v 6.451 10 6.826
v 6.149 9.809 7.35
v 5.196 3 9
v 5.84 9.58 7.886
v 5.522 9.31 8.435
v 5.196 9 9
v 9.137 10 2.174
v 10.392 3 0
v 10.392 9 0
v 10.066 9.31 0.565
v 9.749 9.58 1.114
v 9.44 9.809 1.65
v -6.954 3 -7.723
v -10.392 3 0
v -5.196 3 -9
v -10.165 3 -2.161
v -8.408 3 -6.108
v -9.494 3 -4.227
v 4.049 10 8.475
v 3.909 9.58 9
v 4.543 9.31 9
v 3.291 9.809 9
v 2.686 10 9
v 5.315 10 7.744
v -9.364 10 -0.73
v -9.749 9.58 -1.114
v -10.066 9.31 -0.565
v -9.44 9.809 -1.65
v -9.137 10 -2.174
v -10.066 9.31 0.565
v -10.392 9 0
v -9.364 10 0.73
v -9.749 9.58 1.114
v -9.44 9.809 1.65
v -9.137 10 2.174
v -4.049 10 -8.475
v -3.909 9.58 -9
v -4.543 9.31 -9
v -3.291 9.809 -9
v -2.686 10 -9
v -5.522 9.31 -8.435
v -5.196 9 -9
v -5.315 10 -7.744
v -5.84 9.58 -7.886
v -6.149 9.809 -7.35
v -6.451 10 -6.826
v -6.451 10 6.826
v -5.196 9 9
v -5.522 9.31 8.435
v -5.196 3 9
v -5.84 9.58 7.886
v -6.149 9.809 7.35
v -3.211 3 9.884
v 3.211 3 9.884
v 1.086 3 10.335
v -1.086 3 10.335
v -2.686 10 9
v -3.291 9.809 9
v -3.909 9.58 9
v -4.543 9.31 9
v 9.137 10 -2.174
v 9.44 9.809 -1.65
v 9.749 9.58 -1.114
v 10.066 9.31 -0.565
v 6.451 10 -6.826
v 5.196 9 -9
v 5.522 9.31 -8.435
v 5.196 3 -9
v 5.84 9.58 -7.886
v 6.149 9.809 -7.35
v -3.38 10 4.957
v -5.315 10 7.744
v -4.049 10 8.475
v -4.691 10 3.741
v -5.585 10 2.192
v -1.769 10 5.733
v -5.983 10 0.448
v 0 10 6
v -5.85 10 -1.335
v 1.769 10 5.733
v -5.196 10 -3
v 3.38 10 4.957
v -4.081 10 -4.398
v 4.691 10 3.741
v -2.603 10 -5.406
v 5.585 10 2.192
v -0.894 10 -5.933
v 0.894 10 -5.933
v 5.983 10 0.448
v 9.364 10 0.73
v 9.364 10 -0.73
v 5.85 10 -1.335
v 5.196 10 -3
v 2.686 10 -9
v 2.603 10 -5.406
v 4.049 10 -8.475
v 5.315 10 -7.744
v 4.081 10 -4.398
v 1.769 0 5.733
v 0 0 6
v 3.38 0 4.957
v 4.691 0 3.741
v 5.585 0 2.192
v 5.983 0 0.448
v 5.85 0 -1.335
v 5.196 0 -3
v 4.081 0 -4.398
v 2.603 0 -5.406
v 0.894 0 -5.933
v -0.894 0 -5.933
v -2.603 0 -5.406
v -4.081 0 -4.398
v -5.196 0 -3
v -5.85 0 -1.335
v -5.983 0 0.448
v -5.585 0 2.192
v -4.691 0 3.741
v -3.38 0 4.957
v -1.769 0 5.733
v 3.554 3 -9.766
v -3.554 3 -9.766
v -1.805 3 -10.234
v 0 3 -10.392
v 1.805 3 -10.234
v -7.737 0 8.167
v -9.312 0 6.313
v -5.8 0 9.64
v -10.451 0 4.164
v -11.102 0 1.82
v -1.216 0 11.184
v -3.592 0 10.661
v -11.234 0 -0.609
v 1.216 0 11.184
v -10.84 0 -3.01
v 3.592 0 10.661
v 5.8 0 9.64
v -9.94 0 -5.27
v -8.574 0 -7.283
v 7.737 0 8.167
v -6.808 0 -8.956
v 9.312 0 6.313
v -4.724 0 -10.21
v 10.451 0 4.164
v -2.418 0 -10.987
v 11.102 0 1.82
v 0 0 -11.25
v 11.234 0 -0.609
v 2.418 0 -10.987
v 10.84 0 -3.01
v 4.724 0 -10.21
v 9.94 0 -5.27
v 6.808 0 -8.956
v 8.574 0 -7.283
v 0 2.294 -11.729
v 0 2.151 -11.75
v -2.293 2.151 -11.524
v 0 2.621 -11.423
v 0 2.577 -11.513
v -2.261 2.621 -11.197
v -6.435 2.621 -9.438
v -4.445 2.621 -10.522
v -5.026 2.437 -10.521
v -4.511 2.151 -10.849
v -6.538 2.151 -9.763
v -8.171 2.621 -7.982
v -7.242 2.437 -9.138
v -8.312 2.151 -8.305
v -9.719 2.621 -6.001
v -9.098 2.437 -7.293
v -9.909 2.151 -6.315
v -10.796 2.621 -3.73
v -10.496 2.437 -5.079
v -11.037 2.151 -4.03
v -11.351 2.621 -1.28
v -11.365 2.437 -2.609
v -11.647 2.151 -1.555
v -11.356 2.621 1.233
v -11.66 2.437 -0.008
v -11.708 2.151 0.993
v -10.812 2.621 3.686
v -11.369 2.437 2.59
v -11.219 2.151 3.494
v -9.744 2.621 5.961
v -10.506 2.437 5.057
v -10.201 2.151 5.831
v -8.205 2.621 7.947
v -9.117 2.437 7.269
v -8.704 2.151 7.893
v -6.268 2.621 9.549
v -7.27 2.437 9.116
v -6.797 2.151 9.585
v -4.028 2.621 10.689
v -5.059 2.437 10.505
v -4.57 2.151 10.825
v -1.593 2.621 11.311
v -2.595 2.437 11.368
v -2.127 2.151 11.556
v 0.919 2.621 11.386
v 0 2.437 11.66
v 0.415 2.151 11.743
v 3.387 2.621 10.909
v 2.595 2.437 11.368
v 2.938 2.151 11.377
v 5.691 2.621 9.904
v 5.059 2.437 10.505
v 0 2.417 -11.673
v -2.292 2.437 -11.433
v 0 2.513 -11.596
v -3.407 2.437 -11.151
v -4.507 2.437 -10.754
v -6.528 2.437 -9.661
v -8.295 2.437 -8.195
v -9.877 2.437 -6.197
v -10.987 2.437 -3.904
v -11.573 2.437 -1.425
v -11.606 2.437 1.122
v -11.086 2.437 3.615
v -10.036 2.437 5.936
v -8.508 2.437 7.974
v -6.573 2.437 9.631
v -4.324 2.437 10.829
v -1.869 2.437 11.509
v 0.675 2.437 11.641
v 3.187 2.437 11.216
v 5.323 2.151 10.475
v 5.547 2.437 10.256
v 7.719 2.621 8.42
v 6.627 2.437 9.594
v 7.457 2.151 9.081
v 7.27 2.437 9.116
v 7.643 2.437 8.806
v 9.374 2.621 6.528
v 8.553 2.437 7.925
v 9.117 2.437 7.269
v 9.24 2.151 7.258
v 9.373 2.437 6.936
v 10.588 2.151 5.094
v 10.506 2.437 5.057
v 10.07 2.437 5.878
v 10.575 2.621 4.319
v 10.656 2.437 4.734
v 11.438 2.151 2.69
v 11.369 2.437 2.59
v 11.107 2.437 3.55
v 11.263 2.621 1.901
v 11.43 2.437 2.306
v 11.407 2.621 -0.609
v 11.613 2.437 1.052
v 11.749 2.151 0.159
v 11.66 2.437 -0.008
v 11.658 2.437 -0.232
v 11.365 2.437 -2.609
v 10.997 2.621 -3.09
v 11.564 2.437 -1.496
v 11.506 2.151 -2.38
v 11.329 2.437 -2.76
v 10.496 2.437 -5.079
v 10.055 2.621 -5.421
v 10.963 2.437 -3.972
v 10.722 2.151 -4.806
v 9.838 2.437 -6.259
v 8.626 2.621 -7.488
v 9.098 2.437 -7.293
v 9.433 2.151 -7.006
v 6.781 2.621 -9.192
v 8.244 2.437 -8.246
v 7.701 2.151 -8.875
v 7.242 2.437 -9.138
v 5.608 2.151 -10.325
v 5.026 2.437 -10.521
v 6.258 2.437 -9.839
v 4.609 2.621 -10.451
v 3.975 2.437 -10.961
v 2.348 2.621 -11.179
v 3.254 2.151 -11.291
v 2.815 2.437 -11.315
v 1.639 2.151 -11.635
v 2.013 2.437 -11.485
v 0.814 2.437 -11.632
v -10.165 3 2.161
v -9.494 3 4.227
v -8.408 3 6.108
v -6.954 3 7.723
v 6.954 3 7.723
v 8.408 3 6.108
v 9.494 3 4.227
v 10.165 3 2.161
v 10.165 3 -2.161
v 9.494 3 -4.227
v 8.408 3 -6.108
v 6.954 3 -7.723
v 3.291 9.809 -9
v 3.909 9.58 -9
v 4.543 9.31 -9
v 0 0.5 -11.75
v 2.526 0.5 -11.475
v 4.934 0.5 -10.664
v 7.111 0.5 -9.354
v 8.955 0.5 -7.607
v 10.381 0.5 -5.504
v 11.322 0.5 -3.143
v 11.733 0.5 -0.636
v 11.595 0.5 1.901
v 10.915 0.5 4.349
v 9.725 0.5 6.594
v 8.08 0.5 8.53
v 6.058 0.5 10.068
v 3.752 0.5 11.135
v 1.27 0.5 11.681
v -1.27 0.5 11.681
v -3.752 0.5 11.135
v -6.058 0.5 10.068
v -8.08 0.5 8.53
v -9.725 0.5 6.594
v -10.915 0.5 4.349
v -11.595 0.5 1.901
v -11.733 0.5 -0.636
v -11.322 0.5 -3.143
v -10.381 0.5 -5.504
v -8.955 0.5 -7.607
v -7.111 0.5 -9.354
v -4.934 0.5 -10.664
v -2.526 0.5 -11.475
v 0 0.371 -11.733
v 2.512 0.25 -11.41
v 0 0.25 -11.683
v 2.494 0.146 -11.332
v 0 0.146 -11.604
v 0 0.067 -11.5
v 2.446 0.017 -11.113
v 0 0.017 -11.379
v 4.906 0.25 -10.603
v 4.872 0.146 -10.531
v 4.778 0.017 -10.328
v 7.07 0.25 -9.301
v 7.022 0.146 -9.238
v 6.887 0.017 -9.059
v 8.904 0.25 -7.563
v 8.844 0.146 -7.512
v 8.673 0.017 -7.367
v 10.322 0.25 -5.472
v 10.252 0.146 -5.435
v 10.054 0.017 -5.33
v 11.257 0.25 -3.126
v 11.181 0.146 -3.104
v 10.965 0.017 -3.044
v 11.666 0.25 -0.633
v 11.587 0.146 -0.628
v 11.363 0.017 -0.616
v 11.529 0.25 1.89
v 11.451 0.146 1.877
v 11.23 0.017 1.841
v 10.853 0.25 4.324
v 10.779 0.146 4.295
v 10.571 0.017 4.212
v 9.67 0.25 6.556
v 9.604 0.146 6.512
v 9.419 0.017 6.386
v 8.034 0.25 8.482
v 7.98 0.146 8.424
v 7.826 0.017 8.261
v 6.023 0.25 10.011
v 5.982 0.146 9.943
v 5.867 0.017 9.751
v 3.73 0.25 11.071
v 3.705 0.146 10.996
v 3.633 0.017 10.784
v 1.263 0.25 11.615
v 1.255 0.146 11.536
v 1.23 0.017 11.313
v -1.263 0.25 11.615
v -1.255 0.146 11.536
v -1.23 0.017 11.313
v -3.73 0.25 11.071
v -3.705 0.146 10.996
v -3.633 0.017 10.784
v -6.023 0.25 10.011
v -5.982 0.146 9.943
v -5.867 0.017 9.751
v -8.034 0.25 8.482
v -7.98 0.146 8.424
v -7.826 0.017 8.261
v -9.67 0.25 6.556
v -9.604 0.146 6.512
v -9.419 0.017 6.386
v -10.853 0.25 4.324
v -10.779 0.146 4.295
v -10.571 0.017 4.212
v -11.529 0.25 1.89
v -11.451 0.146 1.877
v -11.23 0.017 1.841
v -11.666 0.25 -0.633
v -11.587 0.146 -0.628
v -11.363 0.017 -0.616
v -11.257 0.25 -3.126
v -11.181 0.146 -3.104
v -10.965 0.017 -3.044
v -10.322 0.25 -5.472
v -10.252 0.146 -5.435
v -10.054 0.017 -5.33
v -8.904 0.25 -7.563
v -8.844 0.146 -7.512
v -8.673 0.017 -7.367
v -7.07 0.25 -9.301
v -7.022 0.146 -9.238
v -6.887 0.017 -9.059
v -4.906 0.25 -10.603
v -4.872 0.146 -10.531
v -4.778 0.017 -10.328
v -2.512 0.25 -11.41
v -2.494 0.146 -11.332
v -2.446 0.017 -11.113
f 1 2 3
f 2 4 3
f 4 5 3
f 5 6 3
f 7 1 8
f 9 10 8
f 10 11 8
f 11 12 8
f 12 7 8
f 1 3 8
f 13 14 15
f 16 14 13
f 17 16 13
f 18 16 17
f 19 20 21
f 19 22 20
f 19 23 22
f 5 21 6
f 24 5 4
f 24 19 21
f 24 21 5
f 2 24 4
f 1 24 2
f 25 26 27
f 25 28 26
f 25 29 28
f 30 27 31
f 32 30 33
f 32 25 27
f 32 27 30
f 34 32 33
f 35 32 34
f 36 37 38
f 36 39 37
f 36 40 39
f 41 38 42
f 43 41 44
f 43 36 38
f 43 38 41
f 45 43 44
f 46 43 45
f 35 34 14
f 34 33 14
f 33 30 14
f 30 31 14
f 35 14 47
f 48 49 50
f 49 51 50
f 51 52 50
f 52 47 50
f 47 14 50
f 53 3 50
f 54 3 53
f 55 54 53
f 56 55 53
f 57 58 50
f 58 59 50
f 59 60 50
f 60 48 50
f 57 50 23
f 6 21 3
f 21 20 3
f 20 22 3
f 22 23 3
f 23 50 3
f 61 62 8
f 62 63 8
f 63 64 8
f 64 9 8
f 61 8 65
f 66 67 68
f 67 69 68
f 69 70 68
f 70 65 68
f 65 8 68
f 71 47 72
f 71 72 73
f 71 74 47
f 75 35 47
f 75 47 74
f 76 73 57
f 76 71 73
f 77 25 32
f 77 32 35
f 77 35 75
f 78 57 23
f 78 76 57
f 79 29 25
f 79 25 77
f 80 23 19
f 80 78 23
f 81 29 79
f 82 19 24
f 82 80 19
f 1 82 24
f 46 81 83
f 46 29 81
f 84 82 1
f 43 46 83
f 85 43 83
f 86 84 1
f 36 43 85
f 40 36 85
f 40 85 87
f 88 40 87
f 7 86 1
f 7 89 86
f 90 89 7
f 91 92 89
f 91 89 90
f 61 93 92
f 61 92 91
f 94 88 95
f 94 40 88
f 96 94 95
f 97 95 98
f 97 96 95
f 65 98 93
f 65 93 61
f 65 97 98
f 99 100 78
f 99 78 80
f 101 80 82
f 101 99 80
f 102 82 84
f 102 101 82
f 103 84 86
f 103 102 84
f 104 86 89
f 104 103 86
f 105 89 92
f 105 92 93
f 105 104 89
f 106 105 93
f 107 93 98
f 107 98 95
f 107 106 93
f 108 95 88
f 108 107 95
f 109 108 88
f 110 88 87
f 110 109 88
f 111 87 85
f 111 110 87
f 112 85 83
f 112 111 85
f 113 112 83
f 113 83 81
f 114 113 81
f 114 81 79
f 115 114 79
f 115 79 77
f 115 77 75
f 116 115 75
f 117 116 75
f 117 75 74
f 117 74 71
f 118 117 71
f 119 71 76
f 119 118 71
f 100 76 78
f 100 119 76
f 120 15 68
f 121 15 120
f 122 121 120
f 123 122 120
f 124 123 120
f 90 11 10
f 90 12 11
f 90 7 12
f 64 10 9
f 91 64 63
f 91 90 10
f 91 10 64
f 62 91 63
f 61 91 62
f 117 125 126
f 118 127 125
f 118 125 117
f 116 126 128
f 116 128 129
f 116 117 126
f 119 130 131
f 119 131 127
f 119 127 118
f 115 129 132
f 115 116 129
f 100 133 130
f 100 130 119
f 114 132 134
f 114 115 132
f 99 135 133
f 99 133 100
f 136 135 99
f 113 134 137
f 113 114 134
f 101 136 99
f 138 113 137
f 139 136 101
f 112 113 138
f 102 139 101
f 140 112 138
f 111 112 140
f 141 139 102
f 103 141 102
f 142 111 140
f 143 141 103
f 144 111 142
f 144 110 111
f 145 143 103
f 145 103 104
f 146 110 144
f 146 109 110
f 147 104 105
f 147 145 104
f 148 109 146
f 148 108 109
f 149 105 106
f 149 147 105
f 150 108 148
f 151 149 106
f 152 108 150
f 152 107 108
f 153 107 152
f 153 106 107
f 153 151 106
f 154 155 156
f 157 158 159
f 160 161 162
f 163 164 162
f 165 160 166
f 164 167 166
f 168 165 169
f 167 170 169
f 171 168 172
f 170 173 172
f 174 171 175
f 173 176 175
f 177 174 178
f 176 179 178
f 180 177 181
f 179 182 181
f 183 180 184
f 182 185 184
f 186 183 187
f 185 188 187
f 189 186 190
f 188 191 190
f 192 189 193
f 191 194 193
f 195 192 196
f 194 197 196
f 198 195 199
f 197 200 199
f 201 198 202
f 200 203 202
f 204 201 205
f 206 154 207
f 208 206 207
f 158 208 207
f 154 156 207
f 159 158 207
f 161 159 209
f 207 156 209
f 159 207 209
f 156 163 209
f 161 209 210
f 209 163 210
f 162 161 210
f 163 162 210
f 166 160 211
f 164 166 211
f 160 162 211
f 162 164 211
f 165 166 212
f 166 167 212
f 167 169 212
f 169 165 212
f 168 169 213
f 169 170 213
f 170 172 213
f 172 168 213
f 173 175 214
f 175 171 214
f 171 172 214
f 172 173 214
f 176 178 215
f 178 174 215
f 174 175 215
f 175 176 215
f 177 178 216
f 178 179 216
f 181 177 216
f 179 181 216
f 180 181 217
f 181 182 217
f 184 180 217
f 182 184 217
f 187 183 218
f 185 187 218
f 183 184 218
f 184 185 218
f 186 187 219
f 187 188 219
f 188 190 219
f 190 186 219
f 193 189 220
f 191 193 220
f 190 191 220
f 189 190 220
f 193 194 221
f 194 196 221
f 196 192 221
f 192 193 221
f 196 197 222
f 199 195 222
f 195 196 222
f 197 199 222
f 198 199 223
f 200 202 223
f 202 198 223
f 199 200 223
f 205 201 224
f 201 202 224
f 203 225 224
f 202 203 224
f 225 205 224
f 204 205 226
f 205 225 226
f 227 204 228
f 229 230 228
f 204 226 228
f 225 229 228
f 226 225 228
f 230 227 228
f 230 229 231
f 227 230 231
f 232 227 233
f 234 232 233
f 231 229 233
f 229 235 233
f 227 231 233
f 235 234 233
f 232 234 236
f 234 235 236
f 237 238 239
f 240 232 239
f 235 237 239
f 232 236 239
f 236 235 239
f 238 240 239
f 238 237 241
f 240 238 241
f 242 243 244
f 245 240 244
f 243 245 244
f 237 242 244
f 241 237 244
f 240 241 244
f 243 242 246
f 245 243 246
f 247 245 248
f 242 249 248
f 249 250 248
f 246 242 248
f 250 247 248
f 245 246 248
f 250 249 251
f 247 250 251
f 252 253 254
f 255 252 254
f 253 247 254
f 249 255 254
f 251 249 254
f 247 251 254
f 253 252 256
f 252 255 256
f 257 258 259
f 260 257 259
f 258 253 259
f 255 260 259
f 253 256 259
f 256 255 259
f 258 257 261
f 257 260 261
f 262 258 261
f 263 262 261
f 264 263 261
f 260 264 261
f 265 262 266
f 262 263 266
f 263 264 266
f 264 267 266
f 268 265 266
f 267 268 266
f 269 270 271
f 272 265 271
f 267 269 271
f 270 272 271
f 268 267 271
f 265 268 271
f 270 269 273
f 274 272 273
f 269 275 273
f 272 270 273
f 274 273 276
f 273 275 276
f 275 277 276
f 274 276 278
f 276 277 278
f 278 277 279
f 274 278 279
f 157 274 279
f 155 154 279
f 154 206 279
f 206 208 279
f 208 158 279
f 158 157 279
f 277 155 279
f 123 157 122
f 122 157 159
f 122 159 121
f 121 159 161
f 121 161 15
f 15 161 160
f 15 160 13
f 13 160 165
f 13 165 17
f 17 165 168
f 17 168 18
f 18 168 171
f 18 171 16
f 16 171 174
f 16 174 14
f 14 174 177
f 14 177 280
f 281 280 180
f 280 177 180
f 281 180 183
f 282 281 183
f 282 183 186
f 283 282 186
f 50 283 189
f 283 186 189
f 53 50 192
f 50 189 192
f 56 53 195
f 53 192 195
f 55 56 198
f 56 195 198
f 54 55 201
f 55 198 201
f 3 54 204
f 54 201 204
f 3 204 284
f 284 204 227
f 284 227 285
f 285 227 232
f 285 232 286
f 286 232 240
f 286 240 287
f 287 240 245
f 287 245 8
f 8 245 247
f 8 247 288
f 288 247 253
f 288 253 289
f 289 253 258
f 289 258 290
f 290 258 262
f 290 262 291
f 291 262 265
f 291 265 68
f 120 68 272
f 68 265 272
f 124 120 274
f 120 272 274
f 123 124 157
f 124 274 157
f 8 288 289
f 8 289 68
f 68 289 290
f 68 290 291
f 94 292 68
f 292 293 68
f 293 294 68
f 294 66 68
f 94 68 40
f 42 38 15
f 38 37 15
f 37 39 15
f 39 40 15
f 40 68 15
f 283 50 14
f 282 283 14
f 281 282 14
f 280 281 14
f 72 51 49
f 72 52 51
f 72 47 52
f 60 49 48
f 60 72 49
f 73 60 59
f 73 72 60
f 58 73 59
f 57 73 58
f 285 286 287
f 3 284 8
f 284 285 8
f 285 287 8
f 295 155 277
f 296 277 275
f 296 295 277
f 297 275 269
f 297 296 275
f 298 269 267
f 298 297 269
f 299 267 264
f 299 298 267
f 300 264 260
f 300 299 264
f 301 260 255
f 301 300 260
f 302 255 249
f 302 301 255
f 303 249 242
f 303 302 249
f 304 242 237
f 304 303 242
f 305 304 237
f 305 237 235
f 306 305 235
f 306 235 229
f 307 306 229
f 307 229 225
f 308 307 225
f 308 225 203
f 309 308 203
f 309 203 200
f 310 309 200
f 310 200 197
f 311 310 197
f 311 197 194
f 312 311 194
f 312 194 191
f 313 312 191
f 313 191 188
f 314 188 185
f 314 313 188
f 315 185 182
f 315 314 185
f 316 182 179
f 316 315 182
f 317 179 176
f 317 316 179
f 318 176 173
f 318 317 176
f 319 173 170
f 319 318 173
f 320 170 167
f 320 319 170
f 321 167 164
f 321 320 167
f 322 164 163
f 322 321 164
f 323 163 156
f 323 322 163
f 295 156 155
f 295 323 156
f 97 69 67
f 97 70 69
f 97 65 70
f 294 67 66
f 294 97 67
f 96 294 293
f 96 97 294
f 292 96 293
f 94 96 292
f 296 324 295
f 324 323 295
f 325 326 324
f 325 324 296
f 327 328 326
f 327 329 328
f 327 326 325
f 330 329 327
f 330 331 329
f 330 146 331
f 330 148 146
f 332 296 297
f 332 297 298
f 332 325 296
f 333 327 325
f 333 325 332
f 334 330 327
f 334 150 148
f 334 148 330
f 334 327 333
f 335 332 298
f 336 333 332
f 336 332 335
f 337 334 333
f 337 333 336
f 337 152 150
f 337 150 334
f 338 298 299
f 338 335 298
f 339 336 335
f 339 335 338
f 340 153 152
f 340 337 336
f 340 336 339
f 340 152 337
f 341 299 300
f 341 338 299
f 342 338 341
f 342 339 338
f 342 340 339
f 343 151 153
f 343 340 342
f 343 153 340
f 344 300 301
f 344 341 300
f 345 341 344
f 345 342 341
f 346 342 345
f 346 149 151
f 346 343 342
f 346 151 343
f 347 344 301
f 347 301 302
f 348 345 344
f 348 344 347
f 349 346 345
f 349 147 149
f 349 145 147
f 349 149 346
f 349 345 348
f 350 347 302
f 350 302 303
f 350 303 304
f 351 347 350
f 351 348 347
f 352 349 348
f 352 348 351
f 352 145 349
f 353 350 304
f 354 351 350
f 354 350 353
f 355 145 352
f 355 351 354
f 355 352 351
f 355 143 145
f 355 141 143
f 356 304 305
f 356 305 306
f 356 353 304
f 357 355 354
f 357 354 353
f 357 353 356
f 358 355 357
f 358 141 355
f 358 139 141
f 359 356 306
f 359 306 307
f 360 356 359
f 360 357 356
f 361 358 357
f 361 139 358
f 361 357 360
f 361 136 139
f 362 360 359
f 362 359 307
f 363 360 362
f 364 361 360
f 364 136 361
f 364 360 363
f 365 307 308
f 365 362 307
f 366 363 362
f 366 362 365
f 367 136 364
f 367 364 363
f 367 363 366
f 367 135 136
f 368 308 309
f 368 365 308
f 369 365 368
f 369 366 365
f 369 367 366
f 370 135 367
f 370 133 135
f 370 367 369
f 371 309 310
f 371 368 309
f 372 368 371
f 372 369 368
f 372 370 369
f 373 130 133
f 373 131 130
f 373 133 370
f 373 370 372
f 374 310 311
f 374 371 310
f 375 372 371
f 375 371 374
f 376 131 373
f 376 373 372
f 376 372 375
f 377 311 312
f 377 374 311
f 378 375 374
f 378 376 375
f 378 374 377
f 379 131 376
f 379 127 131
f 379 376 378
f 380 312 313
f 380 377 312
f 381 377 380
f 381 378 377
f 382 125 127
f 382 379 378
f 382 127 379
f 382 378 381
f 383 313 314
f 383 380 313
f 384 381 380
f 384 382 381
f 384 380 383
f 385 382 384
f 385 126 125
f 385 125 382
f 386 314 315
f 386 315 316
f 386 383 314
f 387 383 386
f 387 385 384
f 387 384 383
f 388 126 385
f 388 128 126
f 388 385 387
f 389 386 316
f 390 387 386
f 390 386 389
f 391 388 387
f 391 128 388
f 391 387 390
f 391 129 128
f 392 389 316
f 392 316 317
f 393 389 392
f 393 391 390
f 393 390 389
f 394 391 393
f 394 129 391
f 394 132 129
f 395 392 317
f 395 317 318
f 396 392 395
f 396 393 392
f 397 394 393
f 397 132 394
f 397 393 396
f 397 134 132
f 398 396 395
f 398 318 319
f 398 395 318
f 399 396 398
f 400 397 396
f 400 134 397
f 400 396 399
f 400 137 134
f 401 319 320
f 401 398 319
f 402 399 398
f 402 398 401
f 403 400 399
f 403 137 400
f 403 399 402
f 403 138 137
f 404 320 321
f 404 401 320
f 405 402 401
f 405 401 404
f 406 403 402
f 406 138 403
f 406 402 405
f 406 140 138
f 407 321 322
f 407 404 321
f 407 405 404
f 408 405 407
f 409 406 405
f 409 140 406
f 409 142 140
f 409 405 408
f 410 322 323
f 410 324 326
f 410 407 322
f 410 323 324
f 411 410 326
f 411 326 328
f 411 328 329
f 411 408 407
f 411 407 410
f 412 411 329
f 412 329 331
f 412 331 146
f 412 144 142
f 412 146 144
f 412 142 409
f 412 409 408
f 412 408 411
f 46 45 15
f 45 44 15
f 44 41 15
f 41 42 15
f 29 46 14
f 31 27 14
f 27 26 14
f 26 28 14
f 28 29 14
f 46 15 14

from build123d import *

# Parameters (mm, degrees)
SKETCH1_R           = 6
BOSS_EXTRUDE1_DEPTH = 10
SKETCH2_R           = 11.75
BOSS_EXTRUDE2_DEPTH = 3
FILLET1_R           = 0.5


with BuildPart() as part:
    # Sketch1 → Boss-Extrude1 (new body)
    with BuildSketch(Plane(origin=(0, 0, 0), x_dir=(1, 0, 0), z_dir=(0, 1, 0))):
        Polygon((10.392304845, 0), (5.196152423, 9), (-5.196152423, 9), (-10.392304845, 0), (-5.196152423, -9), (5.196152423, -9), align=None)
        with Locations(Location((0, 0, 0), (0, 0, 270))):
            Circle(SKETCH1_R, mode=Mode.SUBTRACT)
    extrude(amount=BOSS_EXTRUDE1_DEPTH)

    # Sketch2 → Boss-Extrude2 (add)
    with BuildSketch(Plane.XZ):
        with Locations(Location((0, 0, 0), (0, 0, 270))):
            Circle(SKETCH2_R)
        Polygon((10.392304845, 0), (5.196152423, 9), (-5.196152423, 9), (-10.392304845, 0), (-5.196152423, -9), (5.196152423, -9), align=None, mode=Mode.SUBTRACT)
    extrude(amount=-BOSS_EXTRUDE2_DEPTH)

    # Sketch3 → Cut-Revolve1 (revolve, cut)
    with BuildSketch(Plane.XY, mode=Mode.PRIVATE) as cut_revolve1_sk:
        Polygon((-10.392304845, 9), (-9.392304845, 10), (-10.392304845, 10), align=None)
        Polygon((-10.392304845, 3), (-11.75, 2.5), (-11.75, 3), align=None)
    revolve(cut_revolve1_sk.sketch.rotate(Axis((0, 0, 0), (0, 1, 0)), 270), axis=Axis((0, 0, 0), (0, 1, 0)), mode=Mode.SUBTRACT)

    # Fillet1
    fillet1_edges = [part.edges().sort_by_distance(p)[0] for p in [
        (0, 0, 11.75),
        (0, 2.5, 11.75),
    ]]
    fillet(fillet1_edges, radius=FILLET1_R)


solid = part.part
